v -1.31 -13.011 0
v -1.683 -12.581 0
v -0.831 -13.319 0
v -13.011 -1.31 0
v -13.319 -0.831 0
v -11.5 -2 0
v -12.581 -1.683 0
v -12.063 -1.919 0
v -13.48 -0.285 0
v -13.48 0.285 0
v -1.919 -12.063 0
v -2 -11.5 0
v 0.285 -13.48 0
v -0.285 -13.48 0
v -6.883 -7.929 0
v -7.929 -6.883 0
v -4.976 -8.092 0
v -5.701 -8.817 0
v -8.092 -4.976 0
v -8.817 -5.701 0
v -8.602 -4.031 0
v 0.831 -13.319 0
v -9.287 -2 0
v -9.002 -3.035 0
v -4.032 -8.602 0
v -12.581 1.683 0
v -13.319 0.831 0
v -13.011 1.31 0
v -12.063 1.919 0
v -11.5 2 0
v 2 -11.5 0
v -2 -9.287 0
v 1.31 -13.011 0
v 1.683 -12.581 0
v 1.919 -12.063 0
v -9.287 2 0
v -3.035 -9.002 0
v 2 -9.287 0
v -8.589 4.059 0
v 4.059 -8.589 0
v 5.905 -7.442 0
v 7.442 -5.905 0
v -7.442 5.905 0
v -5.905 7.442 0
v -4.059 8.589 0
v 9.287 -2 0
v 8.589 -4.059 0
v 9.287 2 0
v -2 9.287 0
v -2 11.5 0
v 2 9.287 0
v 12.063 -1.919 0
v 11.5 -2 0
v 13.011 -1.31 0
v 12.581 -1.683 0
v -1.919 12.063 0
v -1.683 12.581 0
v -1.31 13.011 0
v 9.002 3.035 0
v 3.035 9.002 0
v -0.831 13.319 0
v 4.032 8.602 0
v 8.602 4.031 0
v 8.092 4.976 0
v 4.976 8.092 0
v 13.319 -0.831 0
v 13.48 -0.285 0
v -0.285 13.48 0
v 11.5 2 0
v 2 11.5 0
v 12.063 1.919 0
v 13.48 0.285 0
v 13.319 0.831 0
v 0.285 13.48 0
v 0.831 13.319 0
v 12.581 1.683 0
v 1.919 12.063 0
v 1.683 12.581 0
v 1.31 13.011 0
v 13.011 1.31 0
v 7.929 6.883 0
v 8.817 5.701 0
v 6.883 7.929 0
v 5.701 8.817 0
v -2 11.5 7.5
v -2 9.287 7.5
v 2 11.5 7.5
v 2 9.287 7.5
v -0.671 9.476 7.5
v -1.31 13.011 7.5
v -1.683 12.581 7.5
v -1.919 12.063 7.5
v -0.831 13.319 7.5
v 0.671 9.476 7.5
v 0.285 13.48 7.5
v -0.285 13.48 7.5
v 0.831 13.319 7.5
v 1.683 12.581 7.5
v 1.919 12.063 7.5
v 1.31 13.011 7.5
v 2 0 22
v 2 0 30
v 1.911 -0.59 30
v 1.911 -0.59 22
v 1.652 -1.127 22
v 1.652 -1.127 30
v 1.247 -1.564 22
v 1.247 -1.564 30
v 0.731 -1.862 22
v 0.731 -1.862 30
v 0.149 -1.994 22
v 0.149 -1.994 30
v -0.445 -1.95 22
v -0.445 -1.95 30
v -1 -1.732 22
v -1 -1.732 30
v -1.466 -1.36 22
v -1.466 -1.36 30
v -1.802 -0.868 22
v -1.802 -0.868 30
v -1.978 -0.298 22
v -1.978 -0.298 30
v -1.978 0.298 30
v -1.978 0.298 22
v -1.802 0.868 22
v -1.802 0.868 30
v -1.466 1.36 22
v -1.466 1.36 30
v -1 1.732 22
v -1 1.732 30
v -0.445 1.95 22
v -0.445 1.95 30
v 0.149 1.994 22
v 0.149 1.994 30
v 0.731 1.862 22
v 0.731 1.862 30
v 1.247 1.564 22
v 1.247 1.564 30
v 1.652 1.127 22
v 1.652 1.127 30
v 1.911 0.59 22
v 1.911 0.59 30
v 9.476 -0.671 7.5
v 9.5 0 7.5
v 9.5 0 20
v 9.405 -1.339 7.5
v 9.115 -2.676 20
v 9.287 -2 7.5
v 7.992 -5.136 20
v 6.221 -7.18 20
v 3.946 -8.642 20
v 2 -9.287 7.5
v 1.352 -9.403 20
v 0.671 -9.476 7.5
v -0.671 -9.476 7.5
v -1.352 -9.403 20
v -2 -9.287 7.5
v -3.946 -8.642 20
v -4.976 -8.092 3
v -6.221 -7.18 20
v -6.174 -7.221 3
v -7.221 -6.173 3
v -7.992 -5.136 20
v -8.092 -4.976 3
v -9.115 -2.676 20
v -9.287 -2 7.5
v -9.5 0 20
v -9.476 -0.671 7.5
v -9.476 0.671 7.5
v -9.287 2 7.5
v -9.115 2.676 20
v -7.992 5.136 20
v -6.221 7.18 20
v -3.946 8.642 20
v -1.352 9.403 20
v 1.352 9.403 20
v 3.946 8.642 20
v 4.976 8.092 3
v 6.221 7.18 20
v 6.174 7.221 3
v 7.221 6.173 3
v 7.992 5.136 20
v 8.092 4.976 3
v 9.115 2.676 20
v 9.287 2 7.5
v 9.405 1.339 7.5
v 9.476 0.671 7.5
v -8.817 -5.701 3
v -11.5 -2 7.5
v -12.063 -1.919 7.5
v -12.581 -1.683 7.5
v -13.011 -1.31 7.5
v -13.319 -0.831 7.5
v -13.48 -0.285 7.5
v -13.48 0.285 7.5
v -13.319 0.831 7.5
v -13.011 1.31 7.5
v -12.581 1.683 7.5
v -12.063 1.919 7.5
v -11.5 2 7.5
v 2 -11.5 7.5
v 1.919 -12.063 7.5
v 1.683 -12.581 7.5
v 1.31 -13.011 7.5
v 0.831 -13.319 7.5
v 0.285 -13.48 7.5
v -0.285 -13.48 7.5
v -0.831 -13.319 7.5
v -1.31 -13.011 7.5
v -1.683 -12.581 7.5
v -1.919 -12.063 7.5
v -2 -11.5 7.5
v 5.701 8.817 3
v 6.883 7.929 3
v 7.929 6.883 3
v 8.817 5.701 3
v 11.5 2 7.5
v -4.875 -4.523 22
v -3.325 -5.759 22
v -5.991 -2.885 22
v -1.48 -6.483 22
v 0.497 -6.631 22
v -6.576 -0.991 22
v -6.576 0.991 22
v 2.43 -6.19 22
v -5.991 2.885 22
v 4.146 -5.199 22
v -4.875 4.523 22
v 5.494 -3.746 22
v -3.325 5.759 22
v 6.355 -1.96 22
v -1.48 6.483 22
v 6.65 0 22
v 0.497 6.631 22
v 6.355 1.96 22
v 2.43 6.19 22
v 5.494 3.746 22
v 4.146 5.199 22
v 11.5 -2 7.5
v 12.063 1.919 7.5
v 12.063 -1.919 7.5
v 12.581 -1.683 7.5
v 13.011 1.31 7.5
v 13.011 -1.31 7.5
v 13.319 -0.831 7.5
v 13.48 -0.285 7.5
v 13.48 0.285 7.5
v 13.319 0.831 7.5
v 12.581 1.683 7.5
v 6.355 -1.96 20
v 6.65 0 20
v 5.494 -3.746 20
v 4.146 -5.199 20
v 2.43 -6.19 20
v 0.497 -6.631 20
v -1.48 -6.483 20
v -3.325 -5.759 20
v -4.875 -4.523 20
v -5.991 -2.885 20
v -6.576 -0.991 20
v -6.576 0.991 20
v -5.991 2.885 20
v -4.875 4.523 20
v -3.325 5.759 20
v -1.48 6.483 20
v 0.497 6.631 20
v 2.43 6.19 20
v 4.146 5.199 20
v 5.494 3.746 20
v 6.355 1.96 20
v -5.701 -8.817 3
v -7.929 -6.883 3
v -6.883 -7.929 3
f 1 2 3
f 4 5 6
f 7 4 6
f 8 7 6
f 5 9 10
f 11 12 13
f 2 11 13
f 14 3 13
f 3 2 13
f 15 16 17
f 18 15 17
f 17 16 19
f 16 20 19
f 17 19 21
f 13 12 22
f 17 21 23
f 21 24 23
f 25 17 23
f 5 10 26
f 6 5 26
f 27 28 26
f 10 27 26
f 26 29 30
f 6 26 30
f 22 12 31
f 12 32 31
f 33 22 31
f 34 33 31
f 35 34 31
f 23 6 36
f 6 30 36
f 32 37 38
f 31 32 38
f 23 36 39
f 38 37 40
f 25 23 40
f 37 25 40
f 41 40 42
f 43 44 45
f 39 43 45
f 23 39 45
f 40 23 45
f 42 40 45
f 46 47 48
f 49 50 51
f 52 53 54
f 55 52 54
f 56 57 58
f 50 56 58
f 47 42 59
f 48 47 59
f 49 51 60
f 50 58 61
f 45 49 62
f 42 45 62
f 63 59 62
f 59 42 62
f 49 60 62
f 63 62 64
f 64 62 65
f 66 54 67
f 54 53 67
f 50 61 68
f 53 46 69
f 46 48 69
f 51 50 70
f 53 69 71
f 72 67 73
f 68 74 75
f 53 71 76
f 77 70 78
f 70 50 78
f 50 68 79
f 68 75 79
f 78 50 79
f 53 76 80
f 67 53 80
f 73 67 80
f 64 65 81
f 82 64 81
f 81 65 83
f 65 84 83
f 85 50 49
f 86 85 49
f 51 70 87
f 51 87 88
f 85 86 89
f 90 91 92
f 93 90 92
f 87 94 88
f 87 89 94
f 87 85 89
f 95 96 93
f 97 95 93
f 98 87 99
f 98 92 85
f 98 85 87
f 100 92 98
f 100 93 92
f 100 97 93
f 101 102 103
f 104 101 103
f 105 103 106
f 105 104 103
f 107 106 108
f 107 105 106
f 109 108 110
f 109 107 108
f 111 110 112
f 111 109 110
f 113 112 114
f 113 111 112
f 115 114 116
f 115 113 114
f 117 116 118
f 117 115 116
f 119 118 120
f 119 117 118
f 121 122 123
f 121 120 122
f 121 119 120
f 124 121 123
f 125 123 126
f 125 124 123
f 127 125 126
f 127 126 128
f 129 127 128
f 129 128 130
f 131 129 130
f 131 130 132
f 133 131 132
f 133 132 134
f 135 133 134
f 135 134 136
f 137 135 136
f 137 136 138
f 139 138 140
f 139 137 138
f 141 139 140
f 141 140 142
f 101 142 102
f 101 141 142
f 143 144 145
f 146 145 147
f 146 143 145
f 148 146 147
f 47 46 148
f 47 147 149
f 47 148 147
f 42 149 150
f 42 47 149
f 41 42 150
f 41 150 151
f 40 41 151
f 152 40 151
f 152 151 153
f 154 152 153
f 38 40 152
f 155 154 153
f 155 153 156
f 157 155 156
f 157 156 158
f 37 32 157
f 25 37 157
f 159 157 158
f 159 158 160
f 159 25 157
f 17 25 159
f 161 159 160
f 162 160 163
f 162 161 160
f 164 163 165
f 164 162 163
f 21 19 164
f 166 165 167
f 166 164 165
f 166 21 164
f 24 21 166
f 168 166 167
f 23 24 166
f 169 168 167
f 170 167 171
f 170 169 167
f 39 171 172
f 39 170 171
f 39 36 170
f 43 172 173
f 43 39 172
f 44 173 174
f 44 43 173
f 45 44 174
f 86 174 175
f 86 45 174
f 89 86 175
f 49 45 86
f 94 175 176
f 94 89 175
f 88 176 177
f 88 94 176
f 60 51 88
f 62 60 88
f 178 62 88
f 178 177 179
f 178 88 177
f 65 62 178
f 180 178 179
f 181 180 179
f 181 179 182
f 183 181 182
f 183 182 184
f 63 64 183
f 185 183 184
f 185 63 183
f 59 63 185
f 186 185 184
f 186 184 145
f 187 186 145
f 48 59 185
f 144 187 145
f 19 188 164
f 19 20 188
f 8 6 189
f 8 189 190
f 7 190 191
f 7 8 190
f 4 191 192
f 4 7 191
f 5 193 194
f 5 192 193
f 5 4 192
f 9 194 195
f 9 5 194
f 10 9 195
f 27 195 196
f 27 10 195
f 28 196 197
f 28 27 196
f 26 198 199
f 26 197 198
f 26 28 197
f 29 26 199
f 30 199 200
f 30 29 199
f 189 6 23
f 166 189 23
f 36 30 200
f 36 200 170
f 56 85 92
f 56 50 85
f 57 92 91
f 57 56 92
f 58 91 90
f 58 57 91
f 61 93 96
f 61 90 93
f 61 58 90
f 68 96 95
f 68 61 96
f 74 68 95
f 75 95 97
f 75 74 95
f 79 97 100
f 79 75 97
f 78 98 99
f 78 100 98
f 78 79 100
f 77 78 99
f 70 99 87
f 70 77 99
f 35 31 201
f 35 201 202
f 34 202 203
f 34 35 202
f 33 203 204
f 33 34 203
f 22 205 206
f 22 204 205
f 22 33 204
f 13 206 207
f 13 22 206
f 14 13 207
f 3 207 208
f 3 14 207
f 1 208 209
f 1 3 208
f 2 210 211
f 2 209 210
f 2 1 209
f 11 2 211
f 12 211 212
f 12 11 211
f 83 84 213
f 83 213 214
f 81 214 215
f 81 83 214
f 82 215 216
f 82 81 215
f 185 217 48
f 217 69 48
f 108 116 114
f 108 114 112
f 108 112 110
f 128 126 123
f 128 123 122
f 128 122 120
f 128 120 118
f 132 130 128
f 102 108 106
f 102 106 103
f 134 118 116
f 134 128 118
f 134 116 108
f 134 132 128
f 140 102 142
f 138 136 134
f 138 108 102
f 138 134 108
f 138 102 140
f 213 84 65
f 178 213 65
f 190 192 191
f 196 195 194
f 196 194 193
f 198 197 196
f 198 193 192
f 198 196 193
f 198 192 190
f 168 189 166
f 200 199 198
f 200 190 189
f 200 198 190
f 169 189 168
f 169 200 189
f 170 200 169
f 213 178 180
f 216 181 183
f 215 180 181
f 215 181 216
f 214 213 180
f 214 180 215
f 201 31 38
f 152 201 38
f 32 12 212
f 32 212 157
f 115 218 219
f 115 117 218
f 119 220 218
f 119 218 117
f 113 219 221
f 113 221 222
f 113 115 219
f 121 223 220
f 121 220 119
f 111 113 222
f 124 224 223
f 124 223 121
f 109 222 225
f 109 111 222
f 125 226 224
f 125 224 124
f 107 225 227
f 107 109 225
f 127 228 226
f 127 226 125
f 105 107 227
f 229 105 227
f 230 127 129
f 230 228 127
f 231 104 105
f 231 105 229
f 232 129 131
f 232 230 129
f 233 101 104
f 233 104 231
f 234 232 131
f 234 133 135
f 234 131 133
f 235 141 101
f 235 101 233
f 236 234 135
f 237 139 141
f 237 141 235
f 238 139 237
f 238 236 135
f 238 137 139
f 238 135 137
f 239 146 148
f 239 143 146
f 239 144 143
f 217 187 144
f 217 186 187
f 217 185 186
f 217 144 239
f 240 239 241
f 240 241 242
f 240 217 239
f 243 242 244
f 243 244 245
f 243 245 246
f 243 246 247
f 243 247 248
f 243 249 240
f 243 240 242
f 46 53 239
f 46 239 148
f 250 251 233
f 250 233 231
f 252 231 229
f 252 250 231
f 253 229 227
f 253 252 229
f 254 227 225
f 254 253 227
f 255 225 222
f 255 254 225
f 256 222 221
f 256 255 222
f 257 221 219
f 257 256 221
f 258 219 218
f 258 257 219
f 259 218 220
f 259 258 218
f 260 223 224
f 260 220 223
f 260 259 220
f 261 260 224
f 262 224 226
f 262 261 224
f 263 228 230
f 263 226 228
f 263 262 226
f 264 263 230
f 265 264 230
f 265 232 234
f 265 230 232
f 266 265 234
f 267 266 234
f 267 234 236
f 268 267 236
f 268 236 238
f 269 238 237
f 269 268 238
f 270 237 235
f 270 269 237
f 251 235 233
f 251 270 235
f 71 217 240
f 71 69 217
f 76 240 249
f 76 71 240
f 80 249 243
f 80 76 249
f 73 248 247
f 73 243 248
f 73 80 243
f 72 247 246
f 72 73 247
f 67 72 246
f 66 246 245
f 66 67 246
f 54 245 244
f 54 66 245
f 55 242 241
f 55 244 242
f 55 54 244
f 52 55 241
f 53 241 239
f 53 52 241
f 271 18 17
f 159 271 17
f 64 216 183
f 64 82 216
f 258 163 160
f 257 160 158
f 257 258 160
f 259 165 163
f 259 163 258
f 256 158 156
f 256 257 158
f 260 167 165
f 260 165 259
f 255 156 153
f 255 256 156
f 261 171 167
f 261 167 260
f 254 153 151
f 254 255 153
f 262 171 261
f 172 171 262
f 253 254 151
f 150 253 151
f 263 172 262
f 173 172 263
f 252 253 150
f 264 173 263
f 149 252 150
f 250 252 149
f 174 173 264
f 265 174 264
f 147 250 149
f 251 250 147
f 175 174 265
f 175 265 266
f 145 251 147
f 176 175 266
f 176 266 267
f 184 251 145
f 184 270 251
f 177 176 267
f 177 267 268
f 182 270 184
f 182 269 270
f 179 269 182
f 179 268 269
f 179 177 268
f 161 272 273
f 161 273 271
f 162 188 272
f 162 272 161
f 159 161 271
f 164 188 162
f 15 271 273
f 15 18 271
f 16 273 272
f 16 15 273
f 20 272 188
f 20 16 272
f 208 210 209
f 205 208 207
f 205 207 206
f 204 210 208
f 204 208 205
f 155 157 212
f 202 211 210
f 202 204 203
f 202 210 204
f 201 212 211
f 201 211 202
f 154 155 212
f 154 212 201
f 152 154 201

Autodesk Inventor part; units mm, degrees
ref_plane "YZ Plane" through (0, 0, 0) normal (1, 0, 0) x (0, 1, 0)
ref_plane "XZ Plane" through (0, 0, 0) normal (0, 1, 0) x (-1, 0, 0)
ref_plane "XY Plane" through (0, 0, 0) normal (0, 0, 1) x (1, 0, 0)
sketch "Sketch1" plane through (0, 0, 0) normal (0, 0, 1) x (1, 0, 0)
  circle A0 centre (0, 0) radius 9.5
  arc A1 (2, 11.5) -> (-2, 11.5) centre (0, 11.5) ccw
  line L0 (-2, 11.5) -> (-2, 9.2871)
  line L1 (2, 11.5) -> (2, 9.2871)
  line L2 (11.5, -2) -> (9.2871, -2)
  arc A2 (11.5, -2) -> (11.5, 2) centre (11.5, 0) ccw
  line L3 (11.5, 2) -> (9.2871, 2)
  line L4 (-2, -11.5) -> (-2, -9.2871)
  arc A3 (-2, -11.5) -> (2, -11.5) centre (0, -11.5) ccw
  line L5 (2, -11.5) -> (2, -9.2871)
  line L6 (-11.5, 2) -> (-9.2871, 2)
  arc A4 (-11.5, 2) -> (-11.5, -2) centre (-11.5, 0) ccw
  line L7 (-11.5, -2) -> (-9.2871, -2)
  line L8 (0, 0) -> (6.7175, 6.7175) construction
  line L9 (0, 0) -> (9.5, 0) construction
  line L10 (5.7012, 8.8174) -> (4.9765, 8.0923)
  line L11 (8.8174, 5.7012) -> (8.0925, 4.9761)
  arc A5 (8.8174, 5.7012) -> (5.7012, 8.8174) centre (0, 0) ccw
  arc A6 (-10.3078, 2) -> (-10.3696, 1.6499) centre (0, 0) ccw
  arc A7 (-10.3696, -1.6499) -> (-10.3078, -2) centre (0, 0) ccw
  arc A8 (2, 10.3078) -> (1.6499, 10.3696) centre (0, 0) ccw
  arc A9 (-1.6499, 10.3696) -> (-2, 10.3078) centre (0, 0) ccw
  arc A10 (10.3078, -2) -> (10.5, 0) centre (0, 0) ccw
  arc A11 (10.3696, 1.6499) -> (10.3078, 2) centre (0, 0) ccw
  arc A12 (10.3078, -2) -> (10.3078, 2) centre (0, 0) ccw construction
  arc A13 (-2, -10.3078) -> (-1.6499, -10.3696) centre (0, 0) ccw
  arc A14 (1.6499, -10.3696) -> (2, -10.3078) centre (0, 0) ccw
  arc A15 (-2, -10.3078) -> (-1.6499, -10.3696) centre (0, 0) ccw construction
  arc A16 (1.6499, -10.3696) -> (2, -10.3078) centre (0, 0) ccw construction
  line L12 (-8.8174, -5.7012) -> (-8.0925, -4.9761)
  arc A17 (-8.8174, -5.7012) -> (-5.7012, -8.8174) centre (0, 0) ccw
  line L13 (-5.7012, -8.8174) -> (-4.9765, -8.0923)
  line L14 (7.4246, 7.4246) -> (0, 0) construction
  point P0 (-4.9765, -8.0923)
  dimension "d0" = 19
  dimension "d1" = 4
  dimension "d4" = 360
  dimension "d7" = 45
  dimension "d9" = 10.5
  dimension "d12" = 360
extrude "Extrusion1" add sketch "Sketch1" along normal blind 20 contours A0
extrude "Extrusion2" add sketch "Sketch1" along normal blind 7.5 contours A0 L3 A2 L2 | L5 A3 L4 A0 | A0 L0 A1 L1 | A0 L7 A4 L6
extrude "Extrusion3" add sketch "Sketch1" along normal blind 3 contours A0 L10 A5 L11 | L13 A17 L12 A0
sketch "Sketch2" plane through (0, 0, 20) normal (0, 0, 1) x (1, 0, 0)
  circle A0 centre (0, 0) radius 6.65
  dimension "d20" = 13.3
extrude "Extrusion4" add sketch "Sketch2" along normal blind 2
sketch "Sketch3" plane through (0, 0, 22) normal (0, 0, 1) x (1, 0, 0)
  circle A0 centre (0, 0) radius 2
  dimension "d23" = 4
extrude "Extrusion5" add sketch "Sketch3" along normal blind 8
properties part number "Solenoid Valve"
